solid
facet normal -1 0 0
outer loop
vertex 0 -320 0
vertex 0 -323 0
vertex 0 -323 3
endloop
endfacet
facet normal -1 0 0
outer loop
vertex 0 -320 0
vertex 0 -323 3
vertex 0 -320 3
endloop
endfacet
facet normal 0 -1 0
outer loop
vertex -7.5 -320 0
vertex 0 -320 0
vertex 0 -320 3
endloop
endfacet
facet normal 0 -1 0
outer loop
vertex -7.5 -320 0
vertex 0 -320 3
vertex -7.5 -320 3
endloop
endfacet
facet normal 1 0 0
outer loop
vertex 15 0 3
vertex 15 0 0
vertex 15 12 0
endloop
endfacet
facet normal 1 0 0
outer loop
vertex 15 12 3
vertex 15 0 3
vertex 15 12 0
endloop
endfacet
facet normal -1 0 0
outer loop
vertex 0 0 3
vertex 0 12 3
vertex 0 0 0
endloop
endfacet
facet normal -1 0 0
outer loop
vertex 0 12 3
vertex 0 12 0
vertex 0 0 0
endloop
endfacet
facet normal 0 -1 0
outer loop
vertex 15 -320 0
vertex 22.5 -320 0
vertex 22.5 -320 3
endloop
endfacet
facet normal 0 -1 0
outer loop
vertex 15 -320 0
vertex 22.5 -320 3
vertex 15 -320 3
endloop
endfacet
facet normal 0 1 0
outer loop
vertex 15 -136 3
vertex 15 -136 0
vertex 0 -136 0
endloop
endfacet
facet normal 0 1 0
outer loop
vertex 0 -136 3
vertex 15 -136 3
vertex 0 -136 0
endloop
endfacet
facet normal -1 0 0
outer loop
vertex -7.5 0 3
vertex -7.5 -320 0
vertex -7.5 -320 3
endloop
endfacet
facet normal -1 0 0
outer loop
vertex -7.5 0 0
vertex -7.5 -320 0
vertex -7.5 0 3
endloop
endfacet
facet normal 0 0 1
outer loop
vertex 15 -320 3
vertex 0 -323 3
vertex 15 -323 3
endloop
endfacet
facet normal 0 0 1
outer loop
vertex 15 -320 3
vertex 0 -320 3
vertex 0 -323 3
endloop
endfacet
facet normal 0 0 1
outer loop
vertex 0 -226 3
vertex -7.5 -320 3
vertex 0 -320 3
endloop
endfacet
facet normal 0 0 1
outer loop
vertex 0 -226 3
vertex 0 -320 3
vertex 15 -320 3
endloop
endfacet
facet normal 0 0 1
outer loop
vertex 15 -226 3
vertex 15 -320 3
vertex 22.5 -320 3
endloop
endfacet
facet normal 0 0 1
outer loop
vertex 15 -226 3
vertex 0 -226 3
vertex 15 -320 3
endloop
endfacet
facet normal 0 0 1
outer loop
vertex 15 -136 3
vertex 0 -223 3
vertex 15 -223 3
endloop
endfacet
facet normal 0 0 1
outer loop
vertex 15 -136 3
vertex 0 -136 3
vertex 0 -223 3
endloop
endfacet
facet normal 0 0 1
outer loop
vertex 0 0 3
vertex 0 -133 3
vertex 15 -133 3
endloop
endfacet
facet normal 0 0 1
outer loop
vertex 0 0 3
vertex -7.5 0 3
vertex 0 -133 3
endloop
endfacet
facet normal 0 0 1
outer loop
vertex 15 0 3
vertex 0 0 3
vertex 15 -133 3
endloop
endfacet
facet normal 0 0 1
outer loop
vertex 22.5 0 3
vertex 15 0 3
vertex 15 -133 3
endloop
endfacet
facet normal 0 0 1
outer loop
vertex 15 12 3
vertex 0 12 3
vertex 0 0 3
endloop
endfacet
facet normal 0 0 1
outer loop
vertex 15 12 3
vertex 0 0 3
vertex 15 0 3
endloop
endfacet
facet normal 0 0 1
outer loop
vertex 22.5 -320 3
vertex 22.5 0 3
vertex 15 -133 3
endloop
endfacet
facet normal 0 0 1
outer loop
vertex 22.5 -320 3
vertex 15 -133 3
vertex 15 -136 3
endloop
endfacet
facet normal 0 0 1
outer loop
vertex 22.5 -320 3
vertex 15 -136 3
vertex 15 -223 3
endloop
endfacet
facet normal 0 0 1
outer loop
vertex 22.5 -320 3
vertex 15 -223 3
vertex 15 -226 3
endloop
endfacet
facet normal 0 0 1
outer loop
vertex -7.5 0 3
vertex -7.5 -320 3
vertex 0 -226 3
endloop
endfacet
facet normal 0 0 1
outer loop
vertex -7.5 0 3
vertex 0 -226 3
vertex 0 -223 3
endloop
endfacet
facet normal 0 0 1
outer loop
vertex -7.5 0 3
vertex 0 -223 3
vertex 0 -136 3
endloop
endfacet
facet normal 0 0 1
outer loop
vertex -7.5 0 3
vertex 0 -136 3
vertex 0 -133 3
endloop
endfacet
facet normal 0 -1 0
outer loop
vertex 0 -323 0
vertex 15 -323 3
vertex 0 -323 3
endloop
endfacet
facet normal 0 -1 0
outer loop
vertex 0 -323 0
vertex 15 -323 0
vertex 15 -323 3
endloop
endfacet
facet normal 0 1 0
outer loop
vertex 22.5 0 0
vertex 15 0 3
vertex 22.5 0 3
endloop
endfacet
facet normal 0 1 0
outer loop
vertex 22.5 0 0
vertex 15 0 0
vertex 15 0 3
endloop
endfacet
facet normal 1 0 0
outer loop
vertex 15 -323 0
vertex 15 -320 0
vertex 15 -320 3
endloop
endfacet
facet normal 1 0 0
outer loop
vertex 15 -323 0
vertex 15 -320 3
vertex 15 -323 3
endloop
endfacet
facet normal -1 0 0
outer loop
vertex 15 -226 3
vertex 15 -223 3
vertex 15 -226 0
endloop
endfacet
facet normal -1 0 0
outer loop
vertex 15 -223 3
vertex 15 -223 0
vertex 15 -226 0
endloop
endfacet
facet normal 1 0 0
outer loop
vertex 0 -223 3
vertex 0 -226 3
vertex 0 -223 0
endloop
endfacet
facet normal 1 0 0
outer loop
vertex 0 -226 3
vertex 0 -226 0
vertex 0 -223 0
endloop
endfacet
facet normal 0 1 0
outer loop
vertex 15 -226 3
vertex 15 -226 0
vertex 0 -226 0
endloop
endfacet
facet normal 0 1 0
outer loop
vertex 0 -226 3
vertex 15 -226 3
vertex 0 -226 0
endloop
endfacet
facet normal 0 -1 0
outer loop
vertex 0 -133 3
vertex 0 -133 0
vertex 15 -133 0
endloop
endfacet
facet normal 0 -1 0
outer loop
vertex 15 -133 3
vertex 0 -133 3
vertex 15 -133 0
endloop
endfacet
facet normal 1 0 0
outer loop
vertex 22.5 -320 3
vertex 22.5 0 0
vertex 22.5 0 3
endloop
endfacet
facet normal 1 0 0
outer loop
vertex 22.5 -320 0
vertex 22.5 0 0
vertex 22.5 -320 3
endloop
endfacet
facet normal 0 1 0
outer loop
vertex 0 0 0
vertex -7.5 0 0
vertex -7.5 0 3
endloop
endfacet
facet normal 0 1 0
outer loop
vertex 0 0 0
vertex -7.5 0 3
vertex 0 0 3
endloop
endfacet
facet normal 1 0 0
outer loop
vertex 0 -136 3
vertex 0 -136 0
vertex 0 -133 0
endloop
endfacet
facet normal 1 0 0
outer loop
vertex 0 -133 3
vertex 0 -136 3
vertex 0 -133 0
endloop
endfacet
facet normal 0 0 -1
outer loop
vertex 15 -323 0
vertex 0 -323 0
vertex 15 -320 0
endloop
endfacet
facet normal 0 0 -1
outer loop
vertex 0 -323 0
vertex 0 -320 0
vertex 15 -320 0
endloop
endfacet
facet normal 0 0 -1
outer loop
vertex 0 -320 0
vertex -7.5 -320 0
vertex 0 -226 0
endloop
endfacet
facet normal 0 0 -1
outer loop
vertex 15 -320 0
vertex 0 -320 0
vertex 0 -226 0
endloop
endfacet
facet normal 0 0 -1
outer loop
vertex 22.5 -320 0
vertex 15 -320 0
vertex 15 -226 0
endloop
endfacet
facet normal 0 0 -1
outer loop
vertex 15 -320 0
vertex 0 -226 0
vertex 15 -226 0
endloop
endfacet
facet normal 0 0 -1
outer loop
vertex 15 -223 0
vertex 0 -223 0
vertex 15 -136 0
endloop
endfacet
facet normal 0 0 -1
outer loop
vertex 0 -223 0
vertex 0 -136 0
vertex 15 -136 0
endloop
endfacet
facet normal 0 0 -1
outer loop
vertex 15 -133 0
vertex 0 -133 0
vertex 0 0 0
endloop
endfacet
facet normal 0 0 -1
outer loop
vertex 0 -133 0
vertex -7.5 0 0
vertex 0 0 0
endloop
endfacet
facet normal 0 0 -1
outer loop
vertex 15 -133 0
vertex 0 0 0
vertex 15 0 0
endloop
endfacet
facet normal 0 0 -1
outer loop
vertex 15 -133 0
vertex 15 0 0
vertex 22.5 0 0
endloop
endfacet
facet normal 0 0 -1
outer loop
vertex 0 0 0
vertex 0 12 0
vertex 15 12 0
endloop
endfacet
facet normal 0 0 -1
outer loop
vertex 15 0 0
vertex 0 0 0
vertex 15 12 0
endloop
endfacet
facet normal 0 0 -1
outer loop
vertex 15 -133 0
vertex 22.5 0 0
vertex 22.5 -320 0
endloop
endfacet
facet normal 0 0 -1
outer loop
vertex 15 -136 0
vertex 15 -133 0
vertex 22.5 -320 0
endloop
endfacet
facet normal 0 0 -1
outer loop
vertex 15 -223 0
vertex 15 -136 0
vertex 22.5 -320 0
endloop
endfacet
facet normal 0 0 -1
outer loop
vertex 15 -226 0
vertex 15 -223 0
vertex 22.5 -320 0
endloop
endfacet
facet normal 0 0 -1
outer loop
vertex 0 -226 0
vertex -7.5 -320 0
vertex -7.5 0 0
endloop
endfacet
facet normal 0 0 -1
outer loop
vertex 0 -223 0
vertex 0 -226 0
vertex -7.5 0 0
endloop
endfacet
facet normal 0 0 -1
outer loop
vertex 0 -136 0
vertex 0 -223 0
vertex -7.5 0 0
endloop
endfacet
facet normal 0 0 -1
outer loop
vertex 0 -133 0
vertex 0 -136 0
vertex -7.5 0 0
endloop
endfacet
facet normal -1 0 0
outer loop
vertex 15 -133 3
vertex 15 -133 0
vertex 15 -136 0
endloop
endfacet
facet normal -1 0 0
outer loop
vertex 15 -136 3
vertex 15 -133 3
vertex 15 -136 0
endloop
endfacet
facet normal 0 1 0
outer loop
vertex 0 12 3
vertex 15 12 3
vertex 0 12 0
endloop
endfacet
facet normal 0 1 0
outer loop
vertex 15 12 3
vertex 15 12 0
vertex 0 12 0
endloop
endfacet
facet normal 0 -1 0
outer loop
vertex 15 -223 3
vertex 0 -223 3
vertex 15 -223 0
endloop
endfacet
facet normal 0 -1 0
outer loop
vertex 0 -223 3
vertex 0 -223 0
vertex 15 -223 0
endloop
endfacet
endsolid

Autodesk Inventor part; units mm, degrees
ref_plane "YZ Plane" through (0, 0, 0) normal (1, 0, 0) x (0, 1, 0)
ref_plane "XZ Plane" through (0, 0, 0) normal (0, 1, 0) x (-1, 0, 0)
ref_plane "XY Plane" through (0, 0, 0) normal (0, 0, 1) x (1, 0, 0)
sketch "Sketch1" plane through (0, 0, 0) normal (0, 0, 1) x (1, 0, 0)
  line L0 (0, 0) -> (15, 0)
  line L1 (15, 0) -> (15, 12)
  line L2 (15, 12) -> (0, 12)
  line L3 (0, 12) -> (0, 0)
  line L4 (-7.5, 0) -> (22.5, 0)
  line L5 (22.5, 0) -> (22.5, -320)
  line L6 (-7.5, -320) -> (-7.5, 0)
  line L7 (0, -133) -> (15, -133)
  line L8 (15, -133) -> (15, -136)
  line L9 (15, -136) -> (0, -136)
  line L10 (0, -136) -> (0, -133)
  line L11 (15, -320) -> (15, -323)
  line L12 (15, -323) -> (0, -323)
  line L13 (0, -323) -> (0, -320)
  line L14 (22.5, -320) -> (15, -320)
  line L15 (0, -320) -> (-7.5, -320)
  line L16 (0, -223) -> (15, -223)
  line L17 (15, -223) -> (15, -226)
  line L18 (15, -226) -> (0, -226)
  line L19 (0, -226) -> (0, -223)
  point P0 (7.5, 12)
  point P1 (7.5, -320)
  point P2 (7.5, -133)
  point P3 (7.5, 0)
  point P4 (7.5, -323)
  point P5 (7.5, -223)
  dimension "d0" = 15
  dimension "d1" = 12
  dimension "d3" = 30
  dimension "d6" = 3
  dimension "d8" = 15
  dimension "d9" = 15
  dimension "d11" = 7.5
  dimension "d13" = 22.5
  dimension "d15" = 145
  dimension "d16" = 3
  dimension "d17" = 320
  dimension "d18" = 7.5
  dimension "d21" = 22.5
  dimension "d23" = 15
  dimension "d24" = 3
  dimension "d26" = 90
extrude "Extrusion1" add sketch "Sketch1" along normal blind 3
properties part number "back_down_hold"
